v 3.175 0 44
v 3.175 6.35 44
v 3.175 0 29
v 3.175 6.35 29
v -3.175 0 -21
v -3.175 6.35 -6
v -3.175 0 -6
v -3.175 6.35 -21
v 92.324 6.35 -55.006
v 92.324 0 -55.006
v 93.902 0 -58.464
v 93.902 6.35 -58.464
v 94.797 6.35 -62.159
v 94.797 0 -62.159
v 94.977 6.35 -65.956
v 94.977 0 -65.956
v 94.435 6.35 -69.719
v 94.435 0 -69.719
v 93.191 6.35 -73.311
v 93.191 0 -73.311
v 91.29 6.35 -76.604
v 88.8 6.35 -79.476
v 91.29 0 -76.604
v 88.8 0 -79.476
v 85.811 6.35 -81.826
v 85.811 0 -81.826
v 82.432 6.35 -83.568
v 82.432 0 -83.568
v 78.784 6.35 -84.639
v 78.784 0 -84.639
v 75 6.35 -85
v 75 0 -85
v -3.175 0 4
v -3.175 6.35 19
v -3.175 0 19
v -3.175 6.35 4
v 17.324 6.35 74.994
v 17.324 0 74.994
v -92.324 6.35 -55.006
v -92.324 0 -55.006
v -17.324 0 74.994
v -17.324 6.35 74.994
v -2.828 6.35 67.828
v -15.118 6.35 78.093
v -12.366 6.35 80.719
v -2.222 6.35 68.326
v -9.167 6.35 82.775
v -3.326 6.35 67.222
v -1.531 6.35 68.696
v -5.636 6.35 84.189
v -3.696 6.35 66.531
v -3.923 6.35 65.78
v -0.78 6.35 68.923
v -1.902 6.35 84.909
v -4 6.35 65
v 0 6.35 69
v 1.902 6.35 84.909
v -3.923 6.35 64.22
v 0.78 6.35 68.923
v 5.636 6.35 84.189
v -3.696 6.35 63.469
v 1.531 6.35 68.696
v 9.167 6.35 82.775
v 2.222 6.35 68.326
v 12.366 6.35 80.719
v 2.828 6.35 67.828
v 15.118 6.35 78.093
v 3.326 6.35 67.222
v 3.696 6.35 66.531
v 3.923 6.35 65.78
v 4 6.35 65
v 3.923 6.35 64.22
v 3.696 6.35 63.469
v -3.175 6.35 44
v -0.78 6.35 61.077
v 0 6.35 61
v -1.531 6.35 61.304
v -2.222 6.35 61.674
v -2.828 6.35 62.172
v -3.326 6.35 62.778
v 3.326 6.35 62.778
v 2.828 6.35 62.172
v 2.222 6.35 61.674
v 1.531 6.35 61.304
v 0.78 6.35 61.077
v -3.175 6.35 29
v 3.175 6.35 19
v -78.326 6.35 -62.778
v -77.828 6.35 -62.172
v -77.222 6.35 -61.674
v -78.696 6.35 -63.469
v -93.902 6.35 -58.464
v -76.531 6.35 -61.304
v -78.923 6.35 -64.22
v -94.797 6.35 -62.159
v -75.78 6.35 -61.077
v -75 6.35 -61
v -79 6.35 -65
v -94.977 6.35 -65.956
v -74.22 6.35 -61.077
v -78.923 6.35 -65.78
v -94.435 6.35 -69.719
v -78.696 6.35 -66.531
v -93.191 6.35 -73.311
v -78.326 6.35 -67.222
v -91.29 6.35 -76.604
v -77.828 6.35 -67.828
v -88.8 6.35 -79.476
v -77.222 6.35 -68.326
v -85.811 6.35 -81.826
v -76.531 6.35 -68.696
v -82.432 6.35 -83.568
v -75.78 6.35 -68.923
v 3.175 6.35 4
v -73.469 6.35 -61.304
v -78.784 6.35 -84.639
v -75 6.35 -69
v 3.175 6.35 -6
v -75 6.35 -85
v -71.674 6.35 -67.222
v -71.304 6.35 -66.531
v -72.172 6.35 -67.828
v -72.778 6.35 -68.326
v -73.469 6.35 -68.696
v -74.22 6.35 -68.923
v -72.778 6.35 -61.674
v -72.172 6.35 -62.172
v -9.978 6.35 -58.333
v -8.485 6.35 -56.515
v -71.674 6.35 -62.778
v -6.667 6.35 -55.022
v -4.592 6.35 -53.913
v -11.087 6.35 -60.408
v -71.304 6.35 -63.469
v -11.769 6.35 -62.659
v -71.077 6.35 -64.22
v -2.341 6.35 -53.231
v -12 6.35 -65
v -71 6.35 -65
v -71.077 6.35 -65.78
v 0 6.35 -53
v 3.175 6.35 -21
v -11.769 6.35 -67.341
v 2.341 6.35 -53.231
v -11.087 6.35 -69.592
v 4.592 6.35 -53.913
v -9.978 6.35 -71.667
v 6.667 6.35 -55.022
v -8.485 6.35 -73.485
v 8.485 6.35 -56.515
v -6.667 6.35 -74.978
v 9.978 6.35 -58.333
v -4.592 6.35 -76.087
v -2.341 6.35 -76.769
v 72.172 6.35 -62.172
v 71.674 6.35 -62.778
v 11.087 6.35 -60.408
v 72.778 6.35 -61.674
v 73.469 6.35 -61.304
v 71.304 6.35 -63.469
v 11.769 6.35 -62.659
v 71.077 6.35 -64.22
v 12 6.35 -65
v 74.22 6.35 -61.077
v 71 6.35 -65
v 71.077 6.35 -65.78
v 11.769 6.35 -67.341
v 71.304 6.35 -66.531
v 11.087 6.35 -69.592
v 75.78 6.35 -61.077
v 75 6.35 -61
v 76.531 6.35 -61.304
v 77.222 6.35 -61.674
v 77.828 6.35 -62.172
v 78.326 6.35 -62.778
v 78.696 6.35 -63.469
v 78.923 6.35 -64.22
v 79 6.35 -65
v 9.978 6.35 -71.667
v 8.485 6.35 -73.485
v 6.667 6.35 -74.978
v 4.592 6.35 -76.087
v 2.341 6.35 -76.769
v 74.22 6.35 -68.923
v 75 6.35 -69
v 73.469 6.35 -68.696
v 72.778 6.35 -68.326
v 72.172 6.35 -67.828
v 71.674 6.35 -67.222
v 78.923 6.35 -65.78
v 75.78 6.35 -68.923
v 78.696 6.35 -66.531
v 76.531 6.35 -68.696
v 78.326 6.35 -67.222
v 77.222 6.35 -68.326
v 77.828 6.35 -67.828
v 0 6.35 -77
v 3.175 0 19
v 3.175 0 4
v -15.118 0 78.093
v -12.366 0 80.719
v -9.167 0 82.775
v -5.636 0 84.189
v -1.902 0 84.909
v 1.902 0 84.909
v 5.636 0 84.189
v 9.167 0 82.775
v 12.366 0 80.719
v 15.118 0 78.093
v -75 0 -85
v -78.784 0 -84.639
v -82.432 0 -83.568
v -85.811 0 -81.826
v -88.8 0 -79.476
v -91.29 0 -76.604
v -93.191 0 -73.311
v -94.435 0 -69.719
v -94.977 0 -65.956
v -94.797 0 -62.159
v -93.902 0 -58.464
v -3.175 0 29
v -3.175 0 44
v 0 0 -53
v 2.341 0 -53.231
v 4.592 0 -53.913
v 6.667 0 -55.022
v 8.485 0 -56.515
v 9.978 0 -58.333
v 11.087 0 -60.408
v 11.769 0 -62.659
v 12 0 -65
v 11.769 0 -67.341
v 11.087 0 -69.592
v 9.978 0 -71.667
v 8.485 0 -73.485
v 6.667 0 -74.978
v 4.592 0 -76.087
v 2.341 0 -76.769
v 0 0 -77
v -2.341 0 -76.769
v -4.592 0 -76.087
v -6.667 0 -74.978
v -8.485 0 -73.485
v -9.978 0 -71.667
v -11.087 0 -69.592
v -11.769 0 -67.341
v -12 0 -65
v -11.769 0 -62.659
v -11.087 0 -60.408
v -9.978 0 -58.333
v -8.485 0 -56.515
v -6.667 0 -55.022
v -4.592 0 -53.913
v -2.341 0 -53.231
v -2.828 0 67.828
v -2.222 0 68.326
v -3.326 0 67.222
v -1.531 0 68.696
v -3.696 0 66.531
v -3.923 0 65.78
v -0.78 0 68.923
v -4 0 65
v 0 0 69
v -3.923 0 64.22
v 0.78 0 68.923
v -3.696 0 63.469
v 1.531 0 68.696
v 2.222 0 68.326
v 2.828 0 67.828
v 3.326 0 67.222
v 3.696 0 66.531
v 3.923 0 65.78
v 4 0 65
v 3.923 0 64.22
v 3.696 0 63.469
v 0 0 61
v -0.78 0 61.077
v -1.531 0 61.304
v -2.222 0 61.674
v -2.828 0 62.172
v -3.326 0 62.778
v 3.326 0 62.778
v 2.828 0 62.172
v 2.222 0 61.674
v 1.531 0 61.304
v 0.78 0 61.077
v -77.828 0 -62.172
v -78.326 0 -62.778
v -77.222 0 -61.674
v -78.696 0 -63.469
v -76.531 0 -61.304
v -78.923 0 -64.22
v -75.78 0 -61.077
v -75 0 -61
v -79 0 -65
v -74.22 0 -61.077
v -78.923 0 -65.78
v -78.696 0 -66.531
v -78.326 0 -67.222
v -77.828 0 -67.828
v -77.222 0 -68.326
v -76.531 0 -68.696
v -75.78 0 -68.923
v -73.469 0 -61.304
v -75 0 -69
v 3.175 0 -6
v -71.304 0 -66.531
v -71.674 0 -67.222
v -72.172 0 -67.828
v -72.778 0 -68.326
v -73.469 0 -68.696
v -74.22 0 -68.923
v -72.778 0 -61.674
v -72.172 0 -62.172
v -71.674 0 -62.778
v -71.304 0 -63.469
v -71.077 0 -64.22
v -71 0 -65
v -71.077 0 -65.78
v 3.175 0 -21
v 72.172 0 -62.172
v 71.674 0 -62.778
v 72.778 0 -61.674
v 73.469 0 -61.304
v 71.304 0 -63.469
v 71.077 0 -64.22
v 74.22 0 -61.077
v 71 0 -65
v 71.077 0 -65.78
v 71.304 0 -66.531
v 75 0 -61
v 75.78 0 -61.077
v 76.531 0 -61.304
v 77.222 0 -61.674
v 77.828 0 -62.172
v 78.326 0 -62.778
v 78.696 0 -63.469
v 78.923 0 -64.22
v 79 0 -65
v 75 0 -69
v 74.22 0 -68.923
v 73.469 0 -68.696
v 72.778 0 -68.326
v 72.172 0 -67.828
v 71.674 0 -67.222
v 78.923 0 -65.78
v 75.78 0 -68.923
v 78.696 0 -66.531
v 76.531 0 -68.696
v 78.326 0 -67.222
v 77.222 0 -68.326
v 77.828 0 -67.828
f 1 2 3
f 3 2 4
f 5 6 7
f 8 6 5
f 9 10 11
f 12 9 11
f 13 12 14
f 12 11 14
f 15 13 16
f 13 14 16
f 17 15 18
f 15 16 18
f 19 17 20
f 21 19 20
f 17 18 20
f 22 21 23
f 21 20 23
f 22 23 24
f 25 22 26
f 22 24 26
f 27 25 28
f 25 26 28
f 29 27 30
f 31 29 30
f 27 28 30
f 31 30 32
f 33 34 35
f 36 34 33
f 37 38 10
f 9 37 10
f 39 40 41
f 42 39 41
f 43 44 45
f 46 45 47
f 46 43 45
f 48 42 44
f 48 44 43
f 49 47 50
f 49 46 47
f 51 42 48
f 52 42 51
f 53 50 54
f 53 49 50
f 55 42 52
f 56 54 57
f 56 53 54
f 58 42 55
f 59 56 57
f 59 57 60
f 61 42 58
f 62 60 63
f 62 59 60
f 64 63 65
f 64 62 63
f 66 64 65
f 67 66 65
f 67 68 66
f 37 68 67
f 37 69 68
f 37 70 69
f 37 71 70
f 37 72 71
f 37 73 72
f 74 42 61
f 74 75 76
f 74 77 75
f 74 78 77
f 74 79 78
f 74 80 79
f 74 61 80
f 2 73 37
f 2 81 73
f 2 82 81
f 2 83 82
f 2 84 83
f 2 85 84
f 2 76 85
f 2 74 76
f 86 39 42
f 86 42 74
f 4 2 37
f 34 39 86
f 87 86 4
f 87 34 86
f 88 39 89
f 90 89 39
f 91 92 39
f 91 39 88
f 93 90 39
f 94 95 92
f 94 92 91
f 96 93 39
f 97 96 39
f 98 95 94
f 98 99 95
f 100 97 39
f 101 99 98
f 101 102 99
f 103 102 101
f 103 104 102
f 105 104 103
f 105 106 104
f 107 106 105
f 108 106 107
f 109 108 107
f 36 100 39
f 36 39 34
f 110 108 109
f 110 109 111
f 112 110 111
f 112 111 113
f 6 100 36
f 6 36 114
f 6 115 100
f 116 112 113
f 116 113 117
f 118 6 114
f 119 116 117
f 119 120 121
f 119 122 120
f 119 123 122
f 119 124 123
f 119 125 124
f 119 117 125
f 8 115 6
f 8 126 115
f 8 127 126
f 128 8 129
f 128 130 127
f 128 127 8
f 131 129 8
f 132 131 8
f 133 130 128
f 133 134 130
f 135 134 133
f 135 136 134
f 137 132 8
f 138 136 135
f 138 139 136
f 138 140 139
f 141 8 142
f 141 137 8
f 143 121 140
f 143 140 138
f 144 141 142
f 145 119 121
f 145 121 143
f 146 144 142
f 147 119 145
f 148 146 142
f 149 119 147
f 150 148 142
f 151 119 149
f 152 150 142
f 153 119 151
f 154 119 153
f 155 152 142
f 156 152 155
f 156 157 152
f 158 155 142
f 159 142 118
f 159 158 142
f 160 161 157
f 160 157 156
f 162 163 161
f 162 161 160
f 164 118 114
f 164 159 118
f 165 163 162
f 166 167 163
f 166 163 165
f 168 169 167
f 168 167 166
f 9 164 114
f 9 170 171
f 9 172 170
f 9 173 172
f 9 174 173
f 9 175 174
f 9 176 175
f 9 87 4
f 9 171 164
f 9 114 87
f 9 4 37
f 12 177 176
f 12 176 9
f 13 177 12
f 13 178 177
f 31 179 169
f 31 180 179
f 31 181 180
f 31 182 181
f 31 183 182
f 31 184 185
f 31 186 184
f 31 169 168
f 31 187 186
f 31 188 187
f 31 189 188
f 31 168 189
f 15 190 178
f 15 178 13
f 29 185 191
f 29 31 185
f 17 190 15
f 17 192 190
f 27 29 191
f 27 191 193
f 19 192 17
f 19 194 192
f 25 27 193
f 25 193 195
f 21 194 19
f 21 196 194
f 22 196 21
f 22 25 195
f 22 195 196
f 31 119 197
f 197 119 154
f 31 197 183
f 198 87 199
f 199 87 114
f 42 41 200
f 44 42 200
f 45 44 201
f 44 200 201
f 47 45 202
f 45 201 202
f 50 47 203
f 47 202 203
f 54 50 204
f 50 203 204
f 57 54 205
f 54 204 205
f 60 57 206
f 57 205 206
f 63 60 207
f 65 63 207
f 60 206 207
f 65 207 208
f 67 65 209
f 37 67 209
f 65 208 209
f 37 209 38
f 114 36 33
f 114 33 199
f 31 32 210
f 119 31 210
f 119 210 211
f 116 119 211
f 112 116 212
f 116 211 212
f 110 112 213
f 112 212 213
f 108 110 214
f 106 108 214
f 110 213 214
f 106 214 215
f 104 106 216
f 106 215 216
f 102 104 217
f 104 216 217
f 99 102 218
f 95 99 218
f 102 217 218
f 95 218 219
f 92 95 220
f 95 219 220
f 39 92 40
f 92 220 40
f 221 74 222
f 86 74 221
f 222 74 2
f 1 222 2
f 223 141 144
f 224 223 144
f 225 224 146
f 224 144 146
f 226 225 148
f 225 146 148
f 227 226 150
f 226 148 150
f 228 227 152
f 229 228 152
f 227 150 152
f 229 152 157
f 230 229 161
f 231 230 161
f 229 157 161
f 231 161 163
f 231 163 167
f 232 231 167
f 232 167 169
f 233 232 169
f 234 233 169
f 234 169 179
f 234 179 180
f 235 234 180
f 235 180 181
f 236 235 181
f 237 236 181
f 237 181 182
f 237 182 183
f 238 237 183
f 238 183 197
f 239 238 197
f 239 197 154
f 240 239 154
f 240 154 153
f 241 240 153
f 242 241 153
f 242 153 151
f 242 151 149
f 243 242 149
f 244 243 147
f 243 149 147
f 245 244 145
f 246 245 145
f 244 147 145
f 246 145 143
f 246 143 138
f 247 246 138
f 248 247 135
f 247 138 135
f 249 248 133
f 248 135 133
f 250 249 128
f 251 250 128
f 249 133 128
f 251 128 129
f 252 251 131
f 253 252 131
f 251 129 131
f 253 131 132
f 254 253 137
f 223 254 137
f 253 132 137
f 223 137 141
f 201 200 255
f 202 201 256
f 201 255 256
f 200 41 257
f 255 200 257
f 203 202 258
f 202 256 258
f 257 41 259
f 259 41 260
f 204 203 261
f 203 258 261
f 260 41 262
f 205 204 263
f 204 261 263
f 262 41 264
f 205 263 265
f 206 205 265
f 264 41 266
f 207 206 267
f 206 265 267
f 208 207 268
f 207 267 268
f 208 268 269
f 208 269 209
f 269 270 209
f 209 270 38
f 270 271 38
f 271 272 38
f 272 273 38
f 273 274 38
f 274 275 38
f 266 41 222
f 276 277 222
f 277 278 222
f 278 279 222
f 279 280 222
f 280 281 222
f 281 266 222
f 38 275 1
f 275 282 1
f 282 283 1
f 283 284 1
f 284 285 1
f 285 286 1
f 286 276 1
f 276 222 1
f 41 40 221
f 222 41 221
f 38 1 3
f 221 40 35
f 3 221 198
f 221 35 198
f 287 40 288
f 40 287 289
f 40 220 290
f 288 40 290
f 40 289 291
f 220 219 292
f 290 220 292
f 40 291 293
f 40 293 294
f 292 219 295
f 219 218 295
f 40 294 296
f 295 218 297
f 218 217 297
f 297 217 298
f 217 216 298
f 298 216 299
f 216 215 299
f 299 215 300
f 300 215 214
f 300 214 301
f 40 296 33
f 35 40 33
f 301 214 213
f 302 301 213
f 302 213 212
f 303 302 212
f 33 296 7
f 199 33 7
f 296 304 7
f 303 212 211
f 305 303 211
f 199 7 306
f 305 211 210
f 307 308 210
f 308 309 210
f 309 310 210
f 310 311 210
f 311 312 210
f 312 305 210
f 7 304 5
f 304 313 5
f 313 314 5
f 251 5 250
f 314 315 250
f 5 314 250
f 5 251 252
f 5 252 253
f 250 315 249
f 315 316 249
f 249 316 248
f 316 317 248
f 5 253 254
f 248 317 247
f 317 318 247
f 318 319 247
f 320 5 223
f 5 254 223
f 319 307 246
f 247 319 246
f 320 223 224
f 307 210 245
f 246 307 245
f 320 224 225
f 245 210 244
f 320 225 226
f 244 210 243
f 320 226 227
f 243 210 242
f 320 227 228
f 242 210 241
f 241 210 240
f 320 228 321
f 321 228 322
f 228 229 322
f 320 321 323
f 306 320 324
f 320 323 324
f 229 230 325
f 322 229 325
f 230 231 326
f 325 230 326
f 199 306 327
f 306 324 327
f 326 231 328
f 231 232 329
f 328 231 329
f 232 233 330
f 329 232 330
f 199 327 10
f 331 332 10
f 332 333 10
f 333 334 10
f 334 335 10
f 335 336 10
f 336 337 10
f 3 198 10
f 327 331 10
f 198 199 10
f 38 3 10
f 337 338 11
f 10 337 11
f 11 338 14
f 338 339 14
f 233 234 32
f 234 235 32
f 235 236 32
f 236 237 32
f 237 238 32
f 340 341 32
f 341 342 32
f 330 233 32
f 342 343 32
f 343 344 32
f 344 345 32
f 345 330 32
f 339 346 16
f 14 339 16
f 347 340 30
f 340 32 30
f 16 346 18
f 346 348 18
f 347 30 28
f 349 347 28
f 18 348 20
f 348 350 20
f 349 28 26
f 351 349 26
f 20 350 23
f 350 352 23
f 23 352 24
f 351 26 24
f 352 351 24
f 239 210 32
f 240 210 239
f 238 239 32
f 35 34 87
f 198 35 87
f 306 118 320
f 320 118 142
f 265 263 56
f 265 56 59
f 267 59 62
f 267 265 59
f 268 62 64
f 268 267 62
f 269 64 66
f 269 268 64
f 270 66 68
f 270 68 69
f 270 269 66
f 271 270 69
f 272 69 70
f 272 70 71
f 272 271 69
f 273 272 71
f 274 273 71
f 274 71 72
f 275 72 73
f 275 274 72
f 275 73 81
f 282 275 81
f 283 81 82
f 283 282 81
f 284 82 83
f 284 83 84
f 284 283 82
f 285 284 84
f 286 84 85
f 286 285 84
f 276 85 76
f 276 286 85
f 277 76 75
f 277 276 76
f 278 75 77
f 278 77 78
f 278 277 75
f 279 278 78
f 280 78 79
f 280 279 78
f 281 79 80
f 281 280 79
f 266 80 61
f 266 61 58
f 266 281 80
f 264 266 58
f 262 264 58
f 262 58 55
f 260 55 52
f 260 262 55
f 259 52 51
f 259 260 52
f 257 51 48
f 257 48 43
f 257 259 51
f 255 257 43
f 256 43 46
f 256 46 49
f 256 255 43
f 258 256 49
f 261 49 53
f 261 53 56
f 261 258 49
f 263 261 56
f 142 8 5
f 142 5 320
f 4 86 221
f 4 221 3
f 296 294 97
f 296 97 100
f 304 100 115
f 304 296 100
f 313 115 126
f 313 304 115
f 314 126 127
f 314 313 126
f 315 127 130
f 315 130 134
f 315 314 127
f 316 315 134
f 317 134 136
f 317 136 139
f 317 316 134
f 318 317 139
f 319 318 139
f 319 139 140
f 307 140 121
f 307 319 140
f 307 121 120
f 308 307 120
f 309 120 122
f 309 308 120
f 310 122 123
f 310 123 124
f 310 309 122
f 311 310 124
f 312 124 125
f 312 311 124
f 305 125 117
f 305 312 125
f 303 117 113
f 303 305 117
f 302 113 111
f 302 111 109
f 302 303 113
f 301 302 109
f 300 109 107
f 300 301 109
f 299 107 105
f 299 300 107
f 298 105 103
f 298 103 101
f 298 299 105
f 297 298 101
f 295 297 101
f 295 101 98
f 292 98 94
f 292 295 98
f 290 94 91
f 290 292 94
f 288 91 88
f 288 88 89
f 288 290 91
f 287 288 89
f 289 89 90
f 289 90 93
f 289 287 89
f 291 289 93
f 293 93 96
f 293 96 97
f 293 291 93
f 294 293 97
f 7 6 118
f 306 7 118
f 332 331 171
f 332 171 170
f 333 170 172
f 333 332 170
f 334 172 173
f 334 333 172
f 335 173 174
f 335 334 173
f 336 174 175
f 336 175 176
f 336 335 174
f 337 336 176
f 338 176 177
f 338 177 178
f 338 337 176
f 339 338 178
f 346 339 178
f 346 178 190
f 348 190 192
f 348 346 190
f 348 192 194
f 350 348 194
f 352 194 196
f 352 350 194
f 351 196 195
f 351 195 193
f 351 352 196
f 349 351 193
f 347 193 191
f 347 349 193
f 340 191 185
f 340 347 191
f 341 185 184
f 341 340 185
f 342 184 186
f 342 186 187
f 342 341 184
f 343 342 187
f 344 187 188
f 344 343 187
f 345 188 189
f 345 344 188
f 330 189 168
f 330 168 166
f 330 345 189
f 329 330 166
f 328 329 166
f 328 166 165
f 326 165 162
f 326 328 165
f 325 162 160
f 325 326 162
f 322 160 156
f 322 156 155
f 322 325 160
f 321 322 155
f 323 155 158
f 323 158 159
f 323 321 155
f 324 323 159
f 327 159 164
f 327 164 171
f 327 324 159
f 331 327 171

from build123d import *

# Parameters (mm, degrees)
ESQUISSE1_R             = 4
BOSS_EXTRU_1_DEPTH      = 6.35
ESQUISSE2_W             = 6.35
ESQUISSE2_H             = 15
ENL_V_MAT_EXTRU_1_DEPTH = 128.633547706
ESQUISSE3_R             = 12
ENL_V_MAT_EXTRU_2_DEPTH = 128.633547706


with BuildPart() as part:
    # Esquisse1 → Boss.-Extru.1 (new body)
    with BuildSketch(Plane(origin=(0, 0, 0), x_dir=(1, 0, 0), z_dir=(0, 1, 0))):
        with BuildLine():
            Line((-92.323711721, 55.00555093), (-17.323711721, -74.99444907))
            ThreePointArc((-17.323711721, -74.99444907), (0, -85), (17.323711721, -74.99444907))
            Line((17.323711721, -74.99444907), (92.323711721, 55.00555093))
            ThreePointArc((92.323711721, 55.00555093), (92.318905586, 75.00277508), (75, 85))
            Line((75, 85), (-75, 85))
            ThreePointArc((-75, 85), (-92.318905586, 75.00277508), (-92.323711721, 55.00555093))
        make_face()
        with Locations(Location((-75, 65, 0), (0, 0, 270))):
            Circle(ESQUISSE1_R, mode=Mode.SUBTRACT)
        with Locations(Location((75, 65, 0), (0, 0, 270))):
            Circle(ESQUISSE1_R, mode=Mode.SUBTRACT)
        with Locations(Location((0, -65, 0), (0, 0, 270))):
            Circle(ESQUISSE1_R, mode=Mode.SUBTRACT)
    extrude(amount=BOSS_EXTRU_1_DEPTH)

    # Esquisse2 → Enlèv. mat.-Extru.1 (cut, through all)
    with BuildSketch(Plane(origin=(0, 6.35, 0), x_dir=(1, 0, 0), z_dir=(0, 1, 0))):
        with Locations((0, -11.5)):
            Rectangle(ESQUISSE2_W, ESQUISSE2_H)
        with Locations((0, 13.5)):
            Rectangle(ESQUISSE2_W, ESQUISSE2_H)
        with Locations((0, -36.5)):
            Rectangle(ESQUISSE2_W, ESQUISSE2_H)
    extrude(amount=-ENL_V_MAT_EXTRU_1_DEPTH, mode=Mode.SUBTRACT)

    # Esquisse3 → Enlèv. mat.-Extru.2 (cut, through all)
    with BuildSketch(Plane(origin=(0, 6.35, 0), x_dir=(1, 0, 0), z_dir=(0, 1, 0))):
        with Locations(Location((0, 65, 0), (0, 0, 270))):
            Circle(ESQUISSE3_R)
    extrude(amount=-ENL_V_MAT_EXTRU_2_DEPTH, mode=Mode.SUBTRACT)


solid = part.part
